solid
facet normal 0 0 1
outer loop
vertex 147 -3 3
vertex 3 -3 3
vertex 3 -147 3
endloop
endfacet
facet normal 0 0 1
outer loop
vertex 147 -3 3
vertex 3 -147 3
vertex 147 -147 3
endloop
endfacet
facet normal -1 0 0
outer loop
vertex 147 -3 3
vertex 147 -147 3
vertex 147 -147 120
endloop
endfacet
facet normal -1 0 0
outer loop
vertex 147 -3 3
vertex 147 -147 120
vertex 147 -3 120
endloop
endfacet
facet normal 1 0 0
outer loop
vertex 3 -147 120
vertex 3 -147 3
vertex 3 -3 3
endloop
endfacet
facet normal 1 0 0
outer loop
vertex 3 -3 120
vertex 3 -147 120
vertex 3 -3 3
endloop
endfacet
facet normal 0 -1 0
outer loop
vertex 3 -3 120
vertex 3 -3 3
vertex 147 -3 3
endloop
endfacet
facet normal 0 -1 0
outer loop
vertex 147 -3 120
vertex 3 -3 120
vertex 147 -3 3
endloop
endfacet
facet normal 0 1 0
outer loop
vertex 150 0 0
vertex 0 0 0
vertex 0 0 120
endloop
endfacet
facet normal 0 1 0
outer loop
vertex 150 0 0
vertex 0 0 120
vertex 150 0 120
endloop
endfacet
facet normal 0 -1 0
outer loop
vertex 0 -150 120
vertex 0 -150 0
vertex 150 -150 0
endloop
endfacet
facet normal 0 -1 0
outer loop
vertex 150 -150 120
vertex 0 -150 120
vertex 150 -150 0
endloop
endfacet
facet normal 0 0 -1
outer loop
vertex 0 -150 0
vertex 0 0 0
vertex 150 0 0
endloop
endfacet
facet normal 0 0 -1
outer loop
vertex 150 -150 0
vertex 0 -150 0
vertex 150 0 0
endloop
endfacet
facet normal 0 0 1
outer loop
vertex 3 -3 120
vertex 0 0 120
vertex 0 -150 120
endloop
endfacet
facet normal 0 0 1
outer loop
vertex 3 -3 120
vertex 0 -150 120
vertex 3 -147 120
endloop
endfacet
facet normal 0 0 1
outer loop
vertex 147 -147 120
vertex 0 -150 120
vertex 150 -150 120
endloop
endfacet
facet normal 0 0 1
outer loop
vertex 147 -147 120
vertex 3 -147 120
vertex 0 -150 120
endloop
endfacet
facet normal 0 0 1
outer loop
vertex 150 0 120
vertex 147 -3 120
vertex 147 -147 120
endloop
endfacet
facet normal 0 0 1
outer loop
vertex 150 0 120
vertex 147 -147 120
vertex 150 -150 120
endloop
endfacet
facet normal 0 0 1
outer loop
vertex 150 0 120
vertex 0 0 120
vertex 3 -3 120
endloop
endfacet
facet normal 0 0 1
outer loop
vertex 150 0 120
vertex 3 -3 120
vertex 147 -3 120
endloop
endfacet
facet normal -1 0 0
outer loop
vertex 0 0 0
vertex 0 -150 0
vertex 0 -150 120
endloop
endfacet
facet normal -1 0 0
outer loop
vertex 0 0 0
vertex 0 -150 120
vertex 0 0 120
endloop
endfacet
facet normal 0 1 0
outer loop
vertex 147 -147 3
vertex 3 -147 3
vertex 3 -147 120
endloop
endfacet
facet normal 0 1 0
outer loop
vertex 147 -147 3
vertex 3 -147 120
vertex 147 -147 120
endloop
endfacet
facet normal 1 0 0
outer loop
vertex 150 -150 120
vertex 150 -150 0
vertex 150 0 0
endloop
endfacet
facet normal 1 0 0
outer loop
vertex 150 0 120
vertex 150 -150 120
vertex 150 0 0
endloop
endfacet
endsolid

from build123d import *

# Parameters (mm, degrees)
SKETCH_1_W      = 150
SKETCH_1_H      = 150
EXTRUDE_1_DEPTH = 120
SHELL_1_T       = -3


with BuildPart() as part:
    # 草图1 → 凸台-拉伸1 (new body)
    with BuildSketch(Plane.XY):
        with Locations((75, -75)):
            Rectangle(SKETCH_1_W, SKETCH_1_H)
    extrude(amount=EXTRUDE_1_DEPTH)

    # 抽壳1
    shell_1_openings = [part.faces().sort_by_distance(p)[0] for p in [
        (75, -75, 120),
    ]]
    offset(amount=SHELL_1_T, openings=shell_1_openings, kind=Kind.INTERSECTION)


solid = part.part
